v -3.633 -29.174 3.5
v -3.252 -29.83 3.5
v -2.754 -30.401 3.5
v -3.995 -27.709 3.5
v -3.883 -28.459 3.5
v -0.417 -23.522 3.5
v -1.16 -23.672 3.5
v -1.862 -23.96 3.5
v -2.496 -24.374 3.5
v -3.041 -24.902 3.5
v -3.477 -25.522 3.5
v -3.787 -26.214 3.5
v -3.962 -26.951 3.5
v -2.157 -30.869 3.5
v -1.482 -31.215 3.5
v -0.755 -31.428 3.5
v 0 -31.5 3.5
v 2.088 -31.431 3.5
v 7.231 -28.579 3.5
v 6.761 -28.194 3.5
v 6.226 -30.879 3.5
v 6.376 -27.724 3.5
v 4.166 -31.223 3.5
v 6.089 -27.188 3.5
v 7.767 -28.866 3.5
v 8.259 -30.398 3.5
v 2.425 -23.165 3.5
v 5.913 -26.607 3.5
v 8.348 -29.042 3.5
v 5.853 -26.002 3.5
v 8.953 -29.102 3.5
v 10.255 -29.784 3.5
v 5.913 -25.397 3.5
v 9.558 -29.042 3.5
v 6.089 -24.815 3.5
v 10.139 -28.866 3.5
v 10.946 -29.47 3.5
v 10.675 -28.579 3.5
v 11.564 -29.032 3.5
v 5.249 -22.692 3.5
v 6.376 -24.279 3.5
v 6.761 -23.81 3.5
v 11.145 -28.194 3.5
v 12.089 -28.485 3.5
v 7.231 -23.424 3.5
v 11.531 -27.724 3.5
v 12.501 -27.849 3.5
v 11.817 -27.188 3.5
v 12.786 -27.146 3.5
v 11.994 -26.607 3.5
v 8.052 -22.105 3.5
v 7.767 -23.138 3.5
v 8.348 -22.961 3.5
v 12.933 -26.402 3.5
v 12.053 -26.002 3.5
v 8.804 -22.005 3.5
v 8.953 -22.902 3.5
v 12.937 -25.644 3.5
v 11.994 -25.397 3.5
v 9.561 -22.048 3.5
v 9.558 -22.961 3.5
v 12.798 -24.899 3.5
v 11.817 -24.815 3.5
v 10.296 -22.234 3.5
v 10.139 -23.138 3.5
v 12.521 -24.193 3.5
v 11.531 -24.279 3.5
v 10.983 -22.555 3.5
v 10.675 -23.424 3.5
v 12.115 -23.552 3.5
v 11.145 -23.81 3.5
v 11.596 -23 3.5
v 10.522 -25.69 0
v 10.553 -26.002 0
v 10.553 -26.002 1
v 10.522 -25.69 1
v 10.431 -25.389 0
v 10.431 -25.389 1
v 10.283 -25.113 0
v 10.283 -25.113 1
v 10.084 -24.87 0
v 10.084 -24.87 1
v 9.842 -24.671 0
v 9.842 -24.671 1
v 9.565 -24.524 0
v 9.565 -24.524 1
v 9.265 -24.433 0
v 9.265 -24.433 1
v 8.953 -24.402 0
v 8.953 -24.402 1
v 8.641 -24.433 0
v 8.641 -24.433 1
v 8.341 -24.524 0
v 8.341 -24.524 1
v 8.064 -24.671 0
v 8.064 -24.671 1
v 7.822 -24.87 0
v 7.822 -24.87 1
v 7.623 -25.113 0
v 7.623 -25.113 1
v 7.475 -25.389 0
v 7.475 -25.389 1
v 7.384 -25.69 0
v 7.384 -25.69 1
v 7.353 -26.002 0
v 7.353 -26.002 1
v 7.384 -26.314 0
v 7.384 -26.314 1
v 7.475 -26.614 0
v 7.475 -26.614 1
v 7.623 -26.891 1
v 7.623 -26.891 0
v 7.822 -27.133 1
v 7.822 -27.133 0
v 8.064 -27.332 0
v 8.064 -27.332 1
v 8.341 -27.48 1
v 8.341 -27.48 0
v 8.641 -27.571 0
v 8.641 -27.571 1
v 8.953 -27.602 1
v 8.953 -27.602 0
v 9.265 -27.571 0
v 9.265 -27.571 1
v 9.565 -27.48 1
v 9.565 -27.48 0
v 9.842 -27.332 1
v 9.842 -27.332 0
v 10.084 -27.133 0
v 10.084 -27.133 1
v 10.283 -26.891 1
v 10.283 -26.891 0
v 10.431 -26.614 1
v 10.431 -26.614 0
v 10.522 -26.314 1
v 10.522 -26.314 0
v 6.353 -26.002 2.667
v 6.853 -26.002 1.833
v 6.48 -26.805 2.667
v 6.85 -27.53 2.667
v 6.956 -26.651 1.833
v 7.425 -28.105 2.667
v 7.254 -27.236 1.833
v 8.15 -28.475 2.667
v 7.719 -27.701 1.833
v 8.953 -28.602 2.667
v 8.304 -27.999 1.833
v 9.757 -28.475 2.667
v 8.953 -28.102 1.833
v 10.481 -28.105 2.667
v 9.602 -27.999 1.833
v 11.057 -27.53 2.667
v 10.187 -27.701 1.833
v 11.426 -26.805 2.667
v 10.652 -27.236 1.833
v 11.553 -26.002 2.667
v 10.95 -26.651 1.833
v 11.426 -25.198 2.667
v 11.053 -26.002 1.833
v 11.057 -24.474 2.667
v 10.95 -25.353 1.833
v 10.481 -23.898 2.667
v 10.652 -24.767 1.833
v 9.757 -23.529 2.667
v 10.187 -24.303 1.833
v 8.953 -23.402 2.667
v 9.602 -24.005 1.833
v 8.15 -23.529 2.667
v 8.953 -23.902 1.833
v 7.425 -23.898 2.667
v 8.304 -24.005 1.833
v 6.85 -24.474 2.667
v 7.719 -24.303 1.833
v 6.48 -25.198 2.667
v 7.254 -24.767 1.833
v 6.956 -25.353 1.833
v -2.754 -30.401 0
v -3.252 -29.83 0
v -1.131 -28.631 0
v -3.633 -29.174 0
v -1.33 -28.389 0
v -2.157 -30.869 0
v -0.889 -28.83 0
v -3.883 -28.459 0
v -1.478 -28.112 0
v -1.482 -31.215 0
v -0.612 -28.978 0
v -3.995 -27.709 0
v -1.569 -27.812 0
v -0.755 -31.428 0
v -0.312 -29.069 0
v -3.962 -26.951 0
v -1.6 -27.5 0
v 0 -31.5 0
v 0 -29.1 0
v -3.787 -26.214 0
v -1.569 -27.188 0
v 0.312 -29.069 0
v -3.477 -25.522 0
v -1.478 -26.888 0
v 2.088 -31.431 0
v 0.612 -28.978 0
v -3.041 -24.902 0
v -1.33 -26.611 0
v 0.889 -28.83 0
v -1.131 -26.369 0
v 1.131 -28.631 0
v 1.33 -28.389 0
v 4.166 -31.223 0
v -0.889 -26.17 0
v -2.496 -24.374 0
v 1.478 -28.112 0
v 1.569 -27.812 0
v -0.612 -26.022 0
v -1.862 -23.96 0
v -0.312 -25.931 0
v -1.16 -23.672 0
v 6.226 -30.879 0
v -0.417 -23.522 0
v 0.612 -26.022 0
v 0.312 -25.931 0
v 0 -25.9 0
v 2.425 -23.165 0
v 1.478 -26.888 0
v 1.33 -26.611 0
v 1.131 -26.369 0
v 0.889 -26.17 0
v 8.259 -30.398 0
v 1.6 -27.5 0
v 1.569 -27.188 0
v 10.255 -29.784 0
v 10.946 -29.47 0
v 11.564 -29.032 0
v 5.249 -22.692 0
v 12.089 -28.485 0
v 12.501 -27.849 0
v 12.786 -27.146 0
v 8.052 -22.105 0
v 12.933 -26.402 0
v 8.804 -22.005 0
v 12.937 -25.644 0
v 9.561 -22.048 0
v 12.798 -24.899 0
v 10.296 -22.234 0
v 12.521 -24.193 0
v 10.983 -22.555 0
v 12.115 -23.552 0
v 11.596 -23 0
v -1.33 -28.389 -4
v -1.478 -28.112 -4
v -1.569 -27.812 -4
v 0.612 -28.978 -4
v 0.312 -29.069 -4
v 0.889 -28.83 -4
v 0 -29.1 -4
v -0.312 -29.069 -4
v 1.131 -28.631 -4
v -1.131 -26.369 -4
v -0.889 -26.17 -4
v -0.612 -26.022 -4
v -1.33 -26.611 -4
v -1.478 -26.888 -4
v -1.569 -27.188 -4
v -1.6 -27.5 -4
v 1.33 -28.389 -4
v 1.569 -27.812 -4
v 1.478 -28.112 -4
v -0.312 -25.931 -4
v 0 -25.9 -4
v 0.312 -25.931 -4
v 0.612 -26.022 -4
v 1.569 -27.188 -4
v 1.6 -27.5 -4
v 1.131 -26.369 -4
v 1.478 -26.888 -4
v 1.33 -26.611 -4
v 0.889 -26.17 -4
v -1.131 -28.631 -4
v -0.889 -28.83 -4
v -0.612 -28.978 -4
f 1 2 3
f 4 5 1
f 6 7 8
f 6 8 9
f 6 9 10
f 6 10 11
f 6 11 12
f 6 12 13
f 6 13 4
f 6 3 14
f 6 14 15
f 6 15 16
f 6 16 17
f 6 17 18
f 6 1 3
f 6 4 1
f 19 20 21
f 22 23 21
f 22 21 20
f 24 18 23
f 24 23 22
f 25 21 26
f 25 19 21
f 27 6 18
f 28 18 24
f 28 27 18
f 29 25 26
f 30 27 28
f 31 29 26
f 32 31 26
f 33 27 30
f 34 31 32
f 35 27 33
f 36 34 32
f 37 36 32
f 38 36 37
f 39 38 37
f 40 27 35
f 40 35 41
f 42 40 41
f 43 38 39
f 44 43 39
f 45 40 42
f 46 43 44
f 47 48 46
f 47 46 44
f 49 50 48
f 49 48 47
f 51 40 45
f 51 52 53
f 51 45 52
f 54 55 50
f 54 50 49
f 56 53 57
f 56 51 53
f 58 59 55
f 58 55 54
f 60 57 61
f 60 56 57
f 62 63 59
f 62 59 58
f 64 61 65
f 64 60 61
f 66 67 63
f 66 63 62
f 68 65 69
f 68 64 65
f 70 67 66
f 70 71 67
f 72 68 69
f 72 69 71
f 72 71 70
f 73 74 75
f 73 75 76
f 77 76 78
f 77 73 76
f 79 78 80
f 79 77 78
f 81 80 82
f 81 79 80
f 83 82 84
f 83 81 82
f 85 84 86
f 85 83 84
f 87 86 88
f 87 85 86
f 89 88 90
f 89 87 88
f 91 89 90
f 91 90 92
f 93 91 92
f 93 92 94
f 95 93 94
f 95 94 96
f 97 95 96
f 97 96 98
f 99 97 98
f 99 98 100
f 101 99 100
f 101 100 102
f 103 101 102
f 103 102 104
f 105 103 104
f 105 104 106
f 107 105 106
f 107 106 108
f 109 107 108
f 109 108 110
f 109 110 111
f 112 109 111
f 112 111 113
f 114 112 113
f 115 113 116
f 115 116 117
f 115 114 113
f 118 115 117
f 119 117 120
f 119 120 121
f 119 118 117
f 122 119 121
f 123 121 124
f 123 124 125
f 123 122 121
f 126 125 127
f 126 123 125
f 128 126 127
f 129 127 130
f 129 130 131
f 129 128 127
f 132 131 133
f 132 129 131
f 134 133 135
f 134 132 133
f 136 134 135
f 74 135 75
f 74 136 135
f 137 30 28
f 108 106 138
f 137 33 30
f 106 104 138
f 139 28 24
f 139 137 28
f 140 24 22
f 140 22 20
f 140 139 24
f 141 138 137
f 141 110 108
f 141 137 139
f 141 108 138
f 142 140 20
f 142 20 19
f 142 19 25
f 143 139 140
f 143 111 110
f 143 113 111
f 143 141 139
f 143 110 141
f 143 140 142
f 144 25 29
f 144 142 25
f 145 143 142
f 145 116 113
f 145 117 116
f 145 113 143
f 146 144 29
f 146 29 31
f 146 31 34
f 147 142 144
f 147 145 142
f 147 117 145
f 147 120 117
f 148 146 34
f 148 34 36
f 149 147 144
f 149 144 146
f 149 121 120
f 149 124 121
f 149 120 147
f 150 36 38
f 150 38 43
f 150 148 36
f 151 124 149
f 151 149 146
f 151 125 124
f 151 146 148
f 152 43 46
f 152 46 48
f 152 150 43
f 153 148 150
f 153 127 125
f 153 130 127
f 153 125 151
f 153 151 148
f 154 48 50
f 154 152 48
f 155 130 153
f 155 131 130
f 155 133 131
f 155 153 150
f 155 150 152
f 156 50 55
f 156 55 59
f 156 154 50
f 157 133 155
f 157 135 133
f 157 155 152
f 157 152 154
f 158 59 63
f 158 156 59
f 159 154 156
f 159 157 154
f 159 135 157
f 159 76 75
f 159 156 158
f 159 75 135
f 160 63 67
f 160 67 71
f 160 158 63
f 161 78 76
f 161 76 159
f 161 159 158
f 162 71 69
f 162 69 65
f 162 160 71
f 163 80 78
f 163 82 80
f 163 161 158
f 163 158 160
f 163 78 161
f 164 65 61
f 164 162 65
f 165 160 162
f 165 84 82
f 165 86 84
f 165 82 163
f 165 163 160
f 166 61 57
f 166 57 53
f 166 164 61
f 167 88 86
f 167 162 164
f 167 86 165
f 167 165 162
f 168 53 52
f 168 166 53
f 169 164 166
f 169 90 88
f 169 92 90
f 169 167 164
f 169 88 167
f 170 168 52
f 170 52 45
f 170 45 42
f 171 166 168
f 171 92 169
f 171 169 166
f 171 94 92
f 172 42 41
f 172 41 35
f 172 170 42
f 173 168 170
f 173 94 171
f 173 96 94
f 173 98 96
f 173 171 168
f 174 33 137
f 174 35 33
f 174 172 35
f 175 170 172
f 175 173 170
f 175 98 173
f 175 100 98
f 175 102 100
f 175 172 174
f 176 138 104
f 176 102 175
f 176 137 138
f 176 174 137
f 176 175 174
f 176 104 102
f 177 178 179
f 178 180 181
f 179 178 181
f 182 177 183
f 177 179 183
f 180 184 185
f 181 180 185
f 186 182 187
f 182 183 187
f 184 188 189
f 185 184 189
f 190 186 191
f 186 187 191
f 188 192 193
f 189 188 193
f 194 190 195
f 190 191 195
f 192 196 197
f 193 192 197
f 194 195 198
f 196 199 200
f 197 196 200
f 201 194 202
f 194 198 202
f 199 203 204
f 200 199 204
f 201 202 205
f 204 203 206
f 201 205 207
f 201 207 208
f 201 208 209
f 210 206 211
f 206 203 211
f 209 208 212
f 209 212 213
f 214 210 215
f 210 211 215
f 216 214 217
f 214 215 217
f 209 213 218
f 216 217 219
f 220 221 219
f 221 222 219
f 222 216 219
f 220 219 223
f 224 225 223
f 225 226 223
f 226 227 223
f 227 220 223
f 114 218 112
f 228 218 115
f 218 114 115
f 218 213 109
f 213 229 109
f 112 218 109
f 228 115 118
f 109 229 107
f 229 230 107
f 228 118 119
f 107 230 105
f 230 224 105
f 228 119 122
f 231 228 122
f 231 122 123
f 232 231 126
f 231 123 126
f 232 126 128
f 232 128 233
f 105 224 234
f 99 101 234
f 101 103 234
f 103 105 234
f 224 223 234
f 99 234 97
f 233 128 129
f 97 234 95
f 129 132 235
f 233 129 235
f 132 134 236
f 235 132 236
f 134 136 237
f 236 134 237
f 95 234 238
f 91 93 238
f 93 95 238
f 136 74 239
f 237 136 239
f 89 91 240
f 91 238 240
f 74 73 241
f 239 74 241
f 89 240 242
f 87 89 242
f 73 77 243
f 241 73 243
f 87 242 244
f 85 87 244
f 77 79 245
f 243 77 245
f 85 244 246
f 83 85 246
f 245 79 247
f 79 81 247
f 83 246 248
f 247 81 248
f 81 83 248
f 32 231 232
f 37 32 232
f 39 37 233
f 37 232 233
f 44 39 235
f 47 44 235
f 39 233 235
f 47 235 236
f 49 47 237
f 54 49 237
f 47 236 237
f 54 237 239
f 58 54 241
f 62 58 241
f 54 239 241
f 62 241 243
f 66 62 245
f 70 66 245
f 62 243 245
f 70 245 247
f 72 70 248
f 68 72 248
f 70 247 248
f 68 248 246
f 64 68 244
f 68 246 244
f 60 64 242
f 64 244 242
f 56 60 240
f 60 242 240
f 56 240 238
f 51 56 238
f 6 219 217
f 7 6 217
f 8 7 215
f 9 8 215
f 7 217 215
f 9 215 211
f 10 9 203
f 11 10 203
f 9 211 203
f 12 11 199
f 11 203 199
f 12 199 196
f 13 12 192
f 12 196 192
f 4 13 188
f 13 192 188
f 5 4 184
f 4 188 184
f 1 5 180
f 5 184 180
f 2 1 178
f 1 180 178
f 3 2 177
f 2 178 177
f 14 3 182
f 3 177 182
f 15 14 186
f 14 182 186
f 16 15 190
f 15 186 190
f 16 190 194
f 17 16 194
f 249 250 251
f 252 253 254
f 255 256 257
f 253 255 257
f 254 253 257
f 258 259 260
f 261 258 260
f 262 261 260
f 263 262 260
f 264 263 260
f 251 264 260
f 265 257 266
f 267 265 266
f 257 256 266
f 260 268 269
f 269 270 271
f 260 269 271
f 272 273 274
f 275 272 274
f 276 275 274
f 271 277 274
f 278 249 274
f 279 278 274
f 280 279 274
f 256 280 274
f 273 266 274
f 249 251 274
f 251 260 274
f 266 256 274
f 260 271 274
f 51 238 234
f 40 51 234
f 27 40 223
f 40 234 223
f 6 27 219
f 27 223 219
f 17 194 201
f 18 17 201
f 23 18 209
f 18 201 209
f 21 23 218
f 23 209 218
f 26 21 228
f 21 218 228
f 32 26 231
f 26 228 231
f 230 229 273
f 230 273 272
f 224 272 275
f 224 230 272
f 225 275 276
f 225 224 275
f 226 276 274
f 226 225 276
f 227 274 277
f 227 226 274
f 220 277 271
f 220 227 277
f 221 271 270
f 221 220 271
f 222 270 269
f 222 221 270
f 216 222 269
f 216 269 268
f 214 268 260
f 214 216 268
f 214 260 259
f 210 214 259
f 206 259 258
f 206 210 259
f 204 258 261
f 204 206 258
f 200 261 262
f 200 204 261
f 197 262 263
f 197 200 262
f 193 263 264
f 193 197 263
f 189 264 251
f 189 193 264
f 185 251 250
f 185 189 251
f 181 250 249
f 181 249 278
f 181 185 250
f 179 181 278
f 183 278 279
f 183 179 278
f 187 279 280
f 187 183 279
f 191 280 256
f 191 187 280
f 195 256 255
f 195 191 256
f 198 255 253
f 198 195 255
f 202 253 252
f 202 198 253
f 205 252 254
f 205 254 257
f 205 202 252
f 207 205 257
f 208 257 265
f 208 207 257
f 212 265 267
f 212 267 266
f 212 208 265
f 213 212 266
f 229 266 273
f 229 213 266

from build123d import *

# Parameters (mm, degrees)
SKETCH_1_R          = 1.6
EXTRUDE_1_DEPTH     = 4
SKETCH_2_R          = 1.6
EXTRUDE_2_DEPTH     = 4
CUT_EXTRUDE_START   = -0.5
CUT_EXTRUDE_1_DEPTH = 0.5


with BuildPart() as part:
    # 草图1 → 凸台-拉伸1 (new body)
    with BuildSketch(Plane.XY):
        with BuildLine():
            ThreePointArc((-0.416971099, -23.521792476), (-3.994548166, -27.708770095), (0, -31.5))
            ThreePointArc((0, -31.5), (5.198999585, -31.067996448), (10.255396865, -29.783835131))
            ThreePointArc((10.255396865, -29.783835131), (12.798012634, -24.898659157), (8.052200486, -22.104539206))
            ThreePointArc((8.052200486, -22.104539206), (3.83936707, -22.943152918), (-0.416971099, -23.521792476))
        make_face()
        with Locations((8.953124248, -26.001760829)):
            Circle(SKETCH_1_R, mode=Mode.SUBTRACT)
    extrude(amount=EXTRUDE_1_DEPTH)

    # 草图2 → 凸台-拉伸2 (add)
    with BuildSketch(Plane.XY):
        with Locations((0, -27.5)):
            Circle(SKETCH_2_R)
    extrude(amount=-EXTRUDE_2_DEPTH)

    # 草图3 → 切除-旋转1 (revolve, cut)
    with BuildSketch(Plane(origin=(0, -26.001760829, 0), x_dir=(1, 0, 0), z_dir=(0, 1, 0))):
        Polygon((8.953124248, -3.5), (5.853124248, -3.5), (7.353124248, -1), (8.953124248, -1), align=None)
    revolve(axis=Axis((8.953124248, -26.001760829, 1), (0, 0, 1)), mode=Mode.SUBTRACT)

    # 草图5 → 切除-拉伸1 (cut)
    with BuildSketch(Plane.XY.offset(4).offset(CUT_EXTRUDE_START)):
        with BuildLine():
            ThreePointArc((-0.416971099, -23.521792476), (-3.994548166, -27.708770095), (0, -31.5))
            ThreePointArc((0, -31.5), (5.198999585, -31.067996448), (10.255396865, -29.783835131))
            ThreePointArc((10.255396865, -29.783835131), (12.798012634, -24.898659157), (8.052200486, -22.104539206))
            ThreePointArc((8.052200486, -22.104539206), (3.83936707, -22.943152918), (-0.416971099, -23.521792476))
        make_face()
    extrude(amount=CUT_EXTRUDE_1_DEPTH, mode=Mode.SUBTRACT)


solid = part.part
